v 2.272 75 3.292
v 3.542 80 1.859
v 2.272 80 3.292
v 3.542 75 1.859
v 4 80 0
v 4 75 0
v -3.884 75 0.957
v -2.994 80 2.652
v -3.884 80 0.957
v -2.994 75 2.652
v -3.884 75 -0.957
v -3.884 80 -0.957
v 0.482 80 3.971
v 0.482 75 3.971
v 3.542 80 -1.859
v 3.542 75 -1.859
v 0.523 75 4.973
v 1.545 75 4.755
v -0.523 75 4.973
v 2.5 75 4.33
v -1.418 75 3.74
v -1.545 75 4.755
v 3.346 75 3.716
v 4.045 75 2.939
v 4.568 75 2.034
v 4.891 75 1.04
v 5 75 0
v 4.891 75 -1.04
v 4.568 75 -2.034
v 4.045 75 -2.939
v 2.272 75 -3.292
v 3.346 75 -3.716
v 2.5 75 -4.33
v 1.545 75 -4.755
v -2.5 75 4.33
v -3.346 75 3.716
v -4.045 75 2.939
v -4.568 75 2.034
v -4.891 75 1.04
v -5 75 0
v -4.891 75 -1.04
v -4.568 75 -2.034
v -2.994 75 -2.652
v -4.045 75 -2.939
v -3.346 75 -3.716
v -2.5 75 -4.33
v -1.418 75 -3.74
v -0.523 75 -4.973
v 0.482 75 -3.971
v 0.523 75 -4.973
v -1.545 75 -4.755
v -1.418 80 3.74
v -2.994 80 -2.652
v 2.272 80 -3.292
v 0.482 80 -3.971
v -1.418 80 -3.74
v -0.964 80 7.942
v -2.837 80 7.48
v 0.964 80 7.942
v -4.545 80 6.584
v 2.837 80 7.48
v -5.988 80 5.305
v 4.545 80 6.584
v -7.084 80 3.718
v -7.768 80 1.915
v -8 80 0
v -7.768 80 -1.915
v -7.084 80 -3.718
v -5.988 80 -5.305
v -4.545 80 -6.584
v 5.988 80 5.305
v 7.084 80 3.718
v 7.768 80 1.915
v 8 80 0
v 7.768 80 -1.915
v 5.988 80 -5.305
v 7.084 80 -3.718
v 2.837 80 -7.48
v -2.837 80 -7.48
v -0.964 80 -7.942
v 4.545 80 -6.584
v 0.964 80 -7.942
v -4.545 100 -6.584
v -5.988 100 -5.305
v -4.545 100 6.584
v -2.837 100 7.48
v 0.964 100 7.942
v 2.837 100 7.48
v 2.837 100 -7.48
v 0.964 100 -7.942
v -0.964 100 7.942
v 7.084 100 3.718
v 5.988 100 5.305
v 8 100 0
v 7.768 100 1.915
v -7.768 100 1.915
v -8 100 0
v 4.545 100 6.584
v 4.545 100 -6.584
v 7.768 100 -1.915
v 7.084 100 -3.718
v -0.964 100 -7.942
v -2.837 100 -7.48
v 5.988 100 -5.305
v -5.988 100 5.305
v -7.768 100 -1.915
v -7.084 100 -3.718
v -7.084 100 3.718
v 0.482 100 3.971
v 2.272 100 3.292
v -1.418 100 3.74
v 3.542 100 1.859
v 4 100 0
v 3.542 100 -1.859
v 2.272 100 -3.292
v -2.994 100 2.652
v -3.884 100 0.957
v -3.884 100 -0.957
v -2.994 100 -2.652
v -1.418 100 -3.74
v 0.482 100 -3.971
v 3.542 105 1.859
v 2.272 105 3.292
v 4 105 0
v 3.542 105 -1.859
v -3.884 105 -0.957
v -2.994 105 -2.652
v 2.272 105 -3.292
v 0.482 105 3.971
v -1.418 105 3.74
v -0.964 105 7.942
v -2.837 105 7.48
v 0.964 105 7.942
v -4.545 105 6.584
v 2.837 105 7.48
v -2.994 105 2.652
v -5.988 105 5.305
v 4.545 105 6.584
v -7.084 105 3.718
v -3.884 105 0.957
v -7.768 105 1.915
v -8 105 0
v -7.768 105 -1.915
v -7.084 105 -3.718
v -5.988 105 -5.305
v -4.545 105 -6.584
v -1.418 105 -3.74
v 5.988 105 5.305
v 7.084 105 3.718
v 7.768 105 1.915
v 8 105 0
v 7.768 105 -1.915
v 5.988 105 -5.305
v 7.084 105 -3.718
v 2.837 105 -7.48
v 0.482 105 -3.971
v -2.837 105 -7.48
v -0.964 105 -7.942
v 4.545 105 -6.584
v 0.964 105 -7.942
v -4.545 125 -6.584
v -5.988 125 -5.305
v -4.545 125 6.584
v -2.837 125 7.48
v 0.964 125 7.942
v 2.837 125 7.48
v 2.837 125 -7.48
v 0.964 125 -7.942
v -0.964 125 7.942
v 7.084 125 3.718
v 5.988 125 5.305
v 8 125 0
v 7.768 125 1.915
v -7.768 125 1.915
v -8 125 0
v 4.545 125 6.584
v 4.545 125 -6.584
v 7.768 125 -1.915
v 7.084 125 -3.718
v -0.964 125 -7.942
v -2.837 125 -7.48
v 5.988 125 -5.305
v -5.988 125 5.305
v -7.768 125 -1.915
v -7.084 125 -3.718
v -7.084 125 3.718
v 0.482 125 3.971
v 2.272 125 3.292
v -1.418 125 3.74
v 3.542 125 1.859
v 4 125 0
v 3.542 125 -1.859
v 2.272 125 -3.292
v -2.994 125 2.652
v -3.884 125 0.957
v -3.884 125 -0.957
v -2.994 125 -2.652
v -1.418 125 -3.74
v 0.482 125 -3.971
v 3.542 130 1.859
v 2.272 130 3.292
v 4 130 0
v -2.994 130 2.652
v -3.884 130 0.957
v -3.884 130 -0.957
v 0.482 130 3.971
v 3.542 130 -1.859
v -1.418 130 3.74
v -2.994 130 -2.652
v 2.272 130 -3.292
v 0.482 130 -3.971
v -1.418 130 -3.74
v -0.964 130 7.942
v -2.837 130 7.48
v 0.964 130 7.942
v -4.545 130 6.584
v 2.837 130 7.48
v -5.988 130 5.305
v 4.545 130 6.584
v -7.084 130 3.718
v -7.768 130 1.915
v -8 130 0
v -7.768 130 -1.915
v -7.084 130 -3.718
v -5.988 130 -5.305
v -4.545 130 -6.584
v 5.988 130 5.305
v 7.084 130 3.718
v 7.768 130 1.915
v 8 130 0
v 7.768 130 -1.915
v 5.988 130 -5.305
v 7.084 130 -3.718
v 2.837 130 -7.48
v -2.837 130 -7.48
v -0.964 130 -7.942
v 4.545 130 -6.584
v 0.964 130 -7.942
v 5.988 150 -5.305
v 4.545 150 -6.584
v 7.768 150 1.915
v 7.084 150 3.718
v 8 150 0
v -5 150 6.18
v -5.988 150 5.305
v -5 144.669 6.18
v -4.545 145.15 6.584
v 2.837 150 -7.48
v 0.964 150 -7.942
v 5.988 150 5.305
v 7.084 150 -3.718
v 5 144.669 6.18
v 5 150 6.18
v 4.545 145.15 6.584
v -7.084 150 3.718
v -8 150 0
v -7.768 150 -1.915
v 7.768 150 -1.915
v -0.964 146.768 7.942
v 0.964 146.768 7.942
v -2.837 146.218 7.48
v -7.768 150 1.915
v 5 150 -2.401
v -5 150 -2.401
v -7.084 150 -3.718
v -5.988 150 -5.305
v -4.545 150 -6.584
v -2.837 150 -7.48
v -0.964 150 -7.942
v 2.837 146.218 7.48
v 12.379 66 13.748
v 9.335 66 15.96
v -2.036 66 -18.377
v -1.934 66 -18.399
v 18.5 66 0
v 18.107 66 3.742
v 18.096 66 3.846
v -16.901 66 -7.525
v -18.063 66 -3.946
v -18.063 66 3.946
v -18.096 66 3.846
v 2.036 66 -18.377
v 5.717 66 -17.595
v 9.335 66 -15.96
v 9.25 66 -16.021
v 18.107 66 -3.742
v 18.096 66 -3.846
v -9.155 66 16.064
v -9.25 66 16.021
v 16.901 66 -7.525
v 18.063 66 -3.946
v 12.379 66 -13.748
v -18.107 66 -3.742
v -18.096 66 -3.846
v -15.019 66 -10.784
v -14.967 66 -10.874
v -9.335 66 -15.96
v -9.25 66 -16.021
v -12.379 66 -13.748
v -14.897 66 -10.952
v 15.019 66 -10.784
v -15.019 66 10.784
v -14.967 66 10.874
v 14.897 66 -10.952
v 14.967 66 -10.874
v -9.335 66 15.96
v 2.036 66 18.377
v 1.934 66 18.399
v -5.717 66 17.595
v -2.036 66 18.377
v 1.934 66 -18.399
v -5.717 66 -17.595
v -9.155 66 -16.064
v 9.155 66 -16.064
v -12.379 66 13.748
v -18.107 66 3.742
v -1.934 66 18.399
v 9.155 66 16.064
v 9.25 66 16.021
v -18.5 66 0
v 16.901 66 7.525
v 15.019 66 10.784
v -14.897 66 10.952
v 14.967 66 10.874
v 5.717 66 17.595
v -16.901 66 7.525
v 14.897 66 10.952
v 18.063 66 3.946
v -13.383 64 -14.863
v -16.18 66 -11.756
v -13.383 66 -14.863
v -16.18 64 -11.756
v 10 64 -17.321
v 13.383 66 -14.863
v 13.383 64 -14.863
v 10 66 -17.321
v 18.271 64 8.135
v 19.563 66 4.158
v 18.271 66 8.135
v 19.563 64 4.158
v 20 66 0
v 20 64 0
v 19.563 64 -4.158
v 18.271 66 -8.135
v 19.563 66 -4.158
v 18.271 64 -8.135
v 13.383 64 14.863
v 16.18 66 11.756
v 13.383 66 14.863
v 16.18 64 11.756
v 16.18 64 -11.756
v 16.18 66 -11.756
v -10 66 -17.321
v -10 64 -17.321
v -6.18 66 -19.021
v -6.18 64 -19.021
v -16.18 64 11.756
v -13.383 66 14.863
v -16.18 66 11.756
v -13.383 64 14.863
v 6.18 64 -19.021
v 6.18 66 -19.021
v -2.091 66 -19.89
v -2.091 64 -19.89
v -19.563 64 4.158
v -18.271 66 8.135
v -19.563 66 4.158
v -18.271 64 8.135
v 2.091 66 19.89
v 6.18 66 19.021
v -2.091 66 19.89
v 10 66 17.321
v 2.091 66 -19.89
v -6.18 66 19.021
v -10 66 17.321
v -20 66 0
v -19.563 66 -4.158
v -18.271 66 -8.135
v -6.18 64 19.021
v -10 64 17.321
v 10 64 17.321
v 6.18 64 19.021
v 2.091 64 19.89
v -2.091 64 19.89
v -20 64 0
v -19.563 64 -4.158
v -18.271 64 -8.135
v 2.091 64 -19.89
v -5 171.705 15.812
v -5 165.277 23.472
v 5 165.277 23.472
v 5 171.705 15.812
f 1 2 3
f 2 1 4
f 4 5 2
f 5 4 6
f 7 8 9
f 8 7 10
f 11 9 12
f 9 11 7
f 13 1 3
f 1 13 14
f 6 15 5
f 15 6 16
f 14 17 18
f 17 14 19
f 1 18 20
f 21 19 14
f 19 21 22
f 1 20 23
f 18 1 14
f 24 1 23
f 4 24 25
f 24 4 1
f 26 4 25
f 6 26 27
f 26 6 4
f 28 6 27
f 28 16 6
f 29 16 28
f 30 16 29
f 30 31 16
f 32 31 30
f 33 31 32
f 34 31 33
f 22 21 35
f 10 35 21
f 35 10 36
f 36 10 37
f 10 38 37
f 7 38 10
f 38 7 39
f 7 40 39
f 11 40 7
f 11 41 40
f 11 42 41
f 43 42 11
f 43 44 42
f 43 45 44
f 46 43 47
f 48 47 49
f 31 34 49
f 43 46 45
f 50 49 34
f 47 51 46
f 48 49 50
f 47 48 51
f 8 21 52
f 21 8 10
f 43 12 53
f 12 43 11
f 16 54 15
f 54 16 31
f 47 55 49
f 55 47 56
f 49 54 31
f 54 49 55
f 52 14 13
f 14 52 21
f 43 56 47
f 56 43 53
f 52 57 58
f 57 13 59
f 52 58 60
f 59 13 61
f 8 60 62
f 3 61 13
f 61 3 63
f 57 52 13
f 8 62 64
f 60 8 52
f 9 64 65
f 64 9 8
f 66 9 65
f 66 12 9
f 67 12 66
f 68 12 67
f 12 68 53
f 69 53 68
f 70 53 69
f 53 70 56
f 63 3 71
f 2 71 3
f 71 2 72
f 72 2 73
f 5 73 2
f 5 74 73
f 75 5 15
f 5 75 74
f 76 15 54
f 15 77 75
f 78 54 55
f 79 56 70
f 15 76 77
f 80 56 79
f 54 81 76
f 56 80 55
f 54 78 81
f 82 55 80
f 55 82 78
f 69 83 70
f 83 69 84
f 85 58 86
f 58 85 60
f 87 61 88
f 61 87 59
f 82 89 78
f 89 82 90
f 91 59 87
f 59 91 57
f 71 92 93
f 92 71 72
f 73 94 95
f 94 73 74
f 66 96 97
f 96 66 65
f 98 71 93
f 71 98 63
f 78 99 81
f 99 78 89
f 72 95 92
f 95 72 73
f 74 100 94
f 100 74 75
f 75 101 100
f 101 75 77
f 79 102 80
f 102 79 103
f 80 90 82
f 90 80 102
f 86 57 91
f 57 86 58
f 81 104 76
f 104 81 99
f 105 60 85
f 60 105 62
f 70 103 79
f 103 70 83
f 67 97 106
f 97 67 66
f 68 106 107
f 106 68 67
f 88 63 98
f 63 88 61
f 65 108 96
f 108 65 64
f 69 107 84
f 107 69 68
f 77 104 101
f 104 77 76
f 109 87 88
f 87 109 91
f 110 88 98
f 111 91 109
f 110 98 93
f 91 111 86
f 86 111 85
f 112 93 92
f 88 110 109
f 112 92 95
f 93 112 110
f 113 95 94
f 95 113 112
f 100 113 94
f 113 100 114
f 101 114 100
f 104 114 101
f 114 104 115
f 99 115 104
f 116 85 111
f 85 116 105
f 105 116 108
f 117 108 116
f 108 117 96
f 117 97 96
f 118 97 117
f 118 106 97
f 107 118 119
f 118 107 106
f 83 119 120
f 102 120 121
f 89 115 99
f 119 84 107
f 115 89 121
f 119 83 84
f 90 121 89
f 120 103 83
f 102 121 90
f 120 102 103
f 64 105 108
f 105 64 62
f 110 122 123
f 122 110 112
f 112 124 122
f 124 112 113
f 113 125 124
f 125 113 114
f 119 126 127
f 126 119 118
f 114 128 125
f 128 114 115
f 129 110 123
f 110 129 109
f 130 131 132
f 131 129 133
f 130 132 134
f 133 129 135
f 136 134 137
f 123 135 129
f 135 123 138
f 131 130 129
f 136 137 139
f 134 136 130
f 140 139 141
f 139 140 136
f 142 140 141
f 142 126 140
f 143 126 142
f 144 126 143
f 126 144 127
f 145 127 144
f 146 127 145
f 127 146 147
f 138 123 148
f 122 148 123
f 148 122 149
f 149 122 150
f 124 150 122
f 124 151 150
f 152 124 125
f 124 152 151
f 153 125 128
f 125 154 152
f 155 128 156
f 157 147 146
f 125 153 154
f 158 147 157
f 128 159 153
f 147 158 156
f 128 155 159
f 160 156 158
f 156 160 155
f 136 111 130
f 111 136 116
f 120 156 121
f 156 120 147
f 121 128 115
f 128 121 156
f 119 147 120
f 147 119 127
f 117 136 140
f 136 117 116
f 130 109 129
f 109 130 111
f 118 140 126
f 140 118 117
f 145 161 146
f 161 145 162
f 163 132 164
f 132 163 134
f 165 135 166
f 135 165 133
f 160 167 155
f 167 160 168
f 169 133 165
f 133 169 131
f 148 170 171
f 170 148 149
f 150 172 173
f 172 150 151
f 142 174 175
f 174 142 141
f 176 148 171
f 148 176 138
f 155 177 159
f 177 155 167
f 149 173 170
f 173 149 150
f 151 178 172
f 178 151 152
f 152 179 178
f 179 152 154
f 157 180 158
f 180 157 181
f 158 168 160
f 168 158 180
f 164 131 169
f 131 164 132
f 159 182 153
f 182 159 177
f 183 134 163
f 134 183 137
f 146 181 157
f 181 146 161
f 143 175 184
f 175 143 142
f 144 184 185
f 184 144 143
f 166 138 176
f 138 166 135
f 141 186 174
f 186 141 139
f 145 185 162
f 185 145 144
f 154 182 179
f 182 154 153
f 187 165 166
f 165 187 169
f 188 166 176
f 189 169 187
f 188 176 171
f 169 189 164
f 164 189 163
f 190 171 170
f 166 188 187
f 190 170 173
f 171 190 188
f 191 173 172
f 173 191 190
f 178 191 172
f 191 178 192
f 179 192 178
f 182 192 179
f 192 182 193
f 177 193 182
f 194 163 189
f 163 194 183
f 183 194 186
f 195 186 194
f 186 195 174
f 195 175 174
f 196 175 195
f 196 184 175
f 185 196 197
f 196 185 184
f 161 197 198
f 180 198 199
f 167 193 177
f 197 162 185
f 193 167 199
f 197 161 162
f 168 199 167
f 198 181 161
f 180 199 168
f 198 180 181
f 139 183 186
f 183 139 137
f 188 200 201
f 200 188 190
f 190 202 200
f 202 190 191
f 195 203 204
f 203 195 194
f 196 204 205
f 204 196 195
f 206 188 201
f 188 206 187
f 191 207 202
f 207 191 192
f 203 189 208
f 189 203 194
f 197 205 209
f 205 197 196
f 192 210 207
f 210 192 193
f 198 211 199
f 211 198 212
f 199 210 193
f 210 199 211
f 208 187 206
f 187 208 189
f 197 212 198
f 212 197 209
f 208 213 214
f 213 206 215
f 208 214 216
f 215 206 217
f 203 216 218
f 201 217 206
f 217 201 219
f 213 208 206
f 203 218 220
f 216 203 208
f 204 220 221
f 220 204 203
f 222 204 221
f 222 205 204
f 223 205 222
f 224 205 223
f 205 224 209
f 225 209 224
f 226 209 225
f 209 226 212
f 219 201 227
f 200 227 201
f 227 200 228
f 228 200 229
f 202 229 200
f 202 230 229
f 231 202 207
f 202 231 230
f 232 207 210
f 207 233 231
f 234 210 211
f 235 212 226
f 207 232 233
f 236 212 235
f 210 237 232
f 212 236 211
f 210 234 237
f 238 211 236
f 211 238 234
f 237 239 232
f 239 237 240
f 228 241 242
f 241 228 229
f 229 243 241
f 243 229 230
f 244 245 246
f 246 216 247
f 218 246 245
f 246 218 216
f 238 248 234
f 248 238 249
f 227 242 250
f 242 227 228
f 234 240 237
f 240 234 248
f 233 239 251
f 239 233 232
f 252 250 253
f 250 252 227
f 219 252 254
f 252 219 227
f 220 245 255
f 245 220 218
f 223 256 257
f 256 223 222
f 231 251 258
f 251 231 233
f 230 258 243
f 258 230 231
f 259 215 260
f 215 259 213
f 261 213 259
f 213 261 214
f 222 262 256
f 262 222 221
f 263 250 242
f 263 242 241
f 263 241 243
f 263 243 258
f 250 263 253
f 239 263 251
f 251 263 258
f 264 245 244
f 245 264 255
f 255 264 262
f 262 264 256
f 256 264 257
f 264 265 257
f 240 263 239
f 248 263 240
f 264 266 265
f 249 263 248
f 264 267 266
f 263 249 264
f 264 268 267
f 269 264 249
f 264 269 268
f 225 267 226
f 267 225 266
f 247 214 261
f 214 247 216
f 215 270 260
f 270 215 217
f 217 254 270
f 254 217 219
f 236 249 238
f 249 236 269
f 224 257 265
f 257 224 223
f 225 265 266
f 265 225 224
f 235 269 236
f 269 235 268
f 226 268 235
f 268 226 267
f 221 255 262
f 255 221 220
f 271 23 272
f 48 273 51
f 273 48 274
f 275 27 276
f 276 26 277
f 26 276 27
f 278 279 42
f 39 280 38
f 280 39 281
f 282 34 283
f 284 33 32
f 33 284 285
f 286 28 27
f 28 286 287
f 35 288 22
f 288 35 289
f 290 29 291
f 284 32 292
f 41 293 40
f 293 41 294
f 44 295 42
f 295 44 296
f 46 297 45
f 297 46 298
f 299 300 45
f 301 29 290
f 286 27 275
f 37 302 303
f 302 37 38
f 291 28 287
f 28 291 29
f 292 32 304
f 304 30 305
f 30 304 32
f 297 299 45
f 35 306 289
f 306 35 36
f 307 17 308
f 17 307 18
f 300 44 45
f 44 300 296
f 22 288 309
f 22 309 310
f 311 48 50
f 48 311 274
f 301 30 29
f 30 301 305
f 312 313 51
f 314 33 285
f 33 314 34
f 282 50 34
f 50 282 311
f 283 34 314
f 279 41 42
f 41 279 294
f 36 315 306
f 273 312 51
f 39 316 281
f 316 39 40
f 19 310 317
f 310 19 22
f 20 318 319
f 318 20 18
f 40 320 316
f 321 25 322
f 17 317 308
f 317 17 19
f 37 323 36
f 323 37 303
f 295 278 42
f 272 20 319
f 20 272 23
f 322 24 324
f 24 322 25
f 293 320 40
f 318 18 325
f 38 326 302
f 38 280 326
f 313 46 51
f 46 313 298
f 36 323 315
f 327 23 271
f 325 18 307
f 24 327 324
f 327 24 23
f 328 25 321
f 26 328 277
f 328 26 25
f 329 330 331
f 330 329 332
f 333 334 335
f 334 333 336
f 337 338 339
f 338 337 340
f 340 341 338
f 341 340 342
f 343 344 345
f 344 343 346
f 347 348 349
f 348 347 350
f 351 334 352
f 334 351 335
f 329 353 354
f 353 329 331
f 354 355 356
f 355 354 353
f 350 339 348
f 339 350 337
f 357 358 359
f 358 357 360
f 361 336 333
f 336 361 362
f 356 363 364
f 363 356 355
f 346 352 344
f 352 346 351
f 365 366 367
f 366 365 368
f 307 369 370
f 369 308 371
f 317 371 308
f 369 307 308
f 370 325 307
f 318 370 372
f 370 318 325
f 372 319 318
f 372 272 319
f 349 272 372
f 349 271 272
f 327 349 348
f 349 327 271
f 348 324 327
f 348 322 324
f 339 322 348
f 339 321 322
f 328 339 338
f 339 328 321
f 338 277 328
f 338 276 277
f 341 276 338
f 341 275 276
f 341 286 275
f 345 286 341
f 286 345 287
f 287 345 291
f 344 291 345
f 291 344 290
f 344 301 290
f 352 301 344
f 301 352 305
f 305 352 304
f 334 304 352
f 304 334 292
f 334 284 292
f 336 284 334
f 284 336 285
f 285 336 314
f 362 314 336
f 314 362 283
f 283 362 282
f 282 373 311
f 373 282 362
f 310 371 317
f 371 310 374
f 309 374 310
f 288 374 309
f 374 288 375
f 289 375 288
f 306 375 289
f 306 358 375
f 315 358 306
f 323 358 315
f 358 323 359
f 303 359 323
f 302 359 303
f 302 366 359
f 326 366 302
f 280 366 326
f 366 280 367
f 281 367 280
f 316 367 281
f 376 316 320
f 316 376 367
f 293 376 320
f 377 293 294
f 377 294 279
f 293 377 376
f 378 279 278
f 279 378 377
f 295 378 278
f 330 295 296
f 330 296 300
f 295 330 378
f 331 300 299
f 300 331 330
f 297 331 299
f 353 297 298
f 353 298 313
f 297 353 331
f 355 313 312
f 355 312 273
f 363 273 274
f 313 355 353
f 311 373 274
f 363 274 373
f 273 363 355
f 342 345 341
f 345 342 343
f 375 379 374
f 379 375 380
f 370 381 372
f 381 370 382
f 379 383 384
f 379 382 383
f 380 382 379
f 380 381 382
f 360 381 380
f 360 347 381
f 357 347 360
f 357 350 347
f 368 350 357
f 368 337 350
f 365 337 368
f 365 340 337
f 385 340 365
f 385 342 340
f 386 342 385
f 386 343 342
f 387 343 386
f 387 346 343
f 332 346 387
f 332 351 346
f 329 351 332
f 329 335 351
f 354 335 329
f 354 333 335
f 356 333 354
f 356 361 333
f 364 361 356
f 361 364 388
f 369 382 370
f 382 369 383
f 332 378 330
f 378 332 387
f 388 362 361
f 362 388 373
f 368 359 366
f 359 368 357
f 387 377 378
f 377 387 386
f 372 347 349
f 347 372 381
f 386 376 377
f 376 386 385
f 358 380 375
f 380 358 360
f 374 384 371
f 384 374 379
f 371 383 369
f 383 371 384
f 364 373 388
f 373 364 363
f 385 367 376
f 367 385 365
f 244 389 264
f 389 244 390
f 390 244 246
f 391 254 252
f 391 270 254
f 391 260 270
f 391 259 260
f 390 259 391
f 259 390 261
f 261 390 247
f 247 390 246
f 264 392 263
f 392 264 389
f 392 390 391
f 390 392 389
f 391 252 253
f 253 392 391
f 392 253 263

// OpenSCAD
module radioisotope_thermoeletric_generators(posx = 0, posy = 0, posz = 0) {
        translate([posx, posy, posz]){
            
            translate([0,80,0]) rotate([90,0,0]) cylinder(5,4,4);
            translate([0,100,0]) rotate([90,0,0]) cylinder(20,8,8);
            
            translate([0,105,0]) rotate([90,0,0]) cylinder(5,4,4);
            translate([0,125,0]) rotate([90,0,0]) cylinder(20,8,8);
               
            translate([0,130,0]) rotate([90,0,0]) cylinder(5,4,4);
            translate([0,150,0]) rotate([90,0,0]) cylinder(20,8,8);
            
            translate([0,75,0]) rotate([90,0,0]) cylinder(10,5,20);
            translate([0,66,0]) rotate([90,0,0]) cylinder(2,20,20);
            
    translate([0,157,10]) rotate([40,0,0]) cube([10,30,10], center = true);
        }
      
}

radioisotope_thermoeletric_generators();
